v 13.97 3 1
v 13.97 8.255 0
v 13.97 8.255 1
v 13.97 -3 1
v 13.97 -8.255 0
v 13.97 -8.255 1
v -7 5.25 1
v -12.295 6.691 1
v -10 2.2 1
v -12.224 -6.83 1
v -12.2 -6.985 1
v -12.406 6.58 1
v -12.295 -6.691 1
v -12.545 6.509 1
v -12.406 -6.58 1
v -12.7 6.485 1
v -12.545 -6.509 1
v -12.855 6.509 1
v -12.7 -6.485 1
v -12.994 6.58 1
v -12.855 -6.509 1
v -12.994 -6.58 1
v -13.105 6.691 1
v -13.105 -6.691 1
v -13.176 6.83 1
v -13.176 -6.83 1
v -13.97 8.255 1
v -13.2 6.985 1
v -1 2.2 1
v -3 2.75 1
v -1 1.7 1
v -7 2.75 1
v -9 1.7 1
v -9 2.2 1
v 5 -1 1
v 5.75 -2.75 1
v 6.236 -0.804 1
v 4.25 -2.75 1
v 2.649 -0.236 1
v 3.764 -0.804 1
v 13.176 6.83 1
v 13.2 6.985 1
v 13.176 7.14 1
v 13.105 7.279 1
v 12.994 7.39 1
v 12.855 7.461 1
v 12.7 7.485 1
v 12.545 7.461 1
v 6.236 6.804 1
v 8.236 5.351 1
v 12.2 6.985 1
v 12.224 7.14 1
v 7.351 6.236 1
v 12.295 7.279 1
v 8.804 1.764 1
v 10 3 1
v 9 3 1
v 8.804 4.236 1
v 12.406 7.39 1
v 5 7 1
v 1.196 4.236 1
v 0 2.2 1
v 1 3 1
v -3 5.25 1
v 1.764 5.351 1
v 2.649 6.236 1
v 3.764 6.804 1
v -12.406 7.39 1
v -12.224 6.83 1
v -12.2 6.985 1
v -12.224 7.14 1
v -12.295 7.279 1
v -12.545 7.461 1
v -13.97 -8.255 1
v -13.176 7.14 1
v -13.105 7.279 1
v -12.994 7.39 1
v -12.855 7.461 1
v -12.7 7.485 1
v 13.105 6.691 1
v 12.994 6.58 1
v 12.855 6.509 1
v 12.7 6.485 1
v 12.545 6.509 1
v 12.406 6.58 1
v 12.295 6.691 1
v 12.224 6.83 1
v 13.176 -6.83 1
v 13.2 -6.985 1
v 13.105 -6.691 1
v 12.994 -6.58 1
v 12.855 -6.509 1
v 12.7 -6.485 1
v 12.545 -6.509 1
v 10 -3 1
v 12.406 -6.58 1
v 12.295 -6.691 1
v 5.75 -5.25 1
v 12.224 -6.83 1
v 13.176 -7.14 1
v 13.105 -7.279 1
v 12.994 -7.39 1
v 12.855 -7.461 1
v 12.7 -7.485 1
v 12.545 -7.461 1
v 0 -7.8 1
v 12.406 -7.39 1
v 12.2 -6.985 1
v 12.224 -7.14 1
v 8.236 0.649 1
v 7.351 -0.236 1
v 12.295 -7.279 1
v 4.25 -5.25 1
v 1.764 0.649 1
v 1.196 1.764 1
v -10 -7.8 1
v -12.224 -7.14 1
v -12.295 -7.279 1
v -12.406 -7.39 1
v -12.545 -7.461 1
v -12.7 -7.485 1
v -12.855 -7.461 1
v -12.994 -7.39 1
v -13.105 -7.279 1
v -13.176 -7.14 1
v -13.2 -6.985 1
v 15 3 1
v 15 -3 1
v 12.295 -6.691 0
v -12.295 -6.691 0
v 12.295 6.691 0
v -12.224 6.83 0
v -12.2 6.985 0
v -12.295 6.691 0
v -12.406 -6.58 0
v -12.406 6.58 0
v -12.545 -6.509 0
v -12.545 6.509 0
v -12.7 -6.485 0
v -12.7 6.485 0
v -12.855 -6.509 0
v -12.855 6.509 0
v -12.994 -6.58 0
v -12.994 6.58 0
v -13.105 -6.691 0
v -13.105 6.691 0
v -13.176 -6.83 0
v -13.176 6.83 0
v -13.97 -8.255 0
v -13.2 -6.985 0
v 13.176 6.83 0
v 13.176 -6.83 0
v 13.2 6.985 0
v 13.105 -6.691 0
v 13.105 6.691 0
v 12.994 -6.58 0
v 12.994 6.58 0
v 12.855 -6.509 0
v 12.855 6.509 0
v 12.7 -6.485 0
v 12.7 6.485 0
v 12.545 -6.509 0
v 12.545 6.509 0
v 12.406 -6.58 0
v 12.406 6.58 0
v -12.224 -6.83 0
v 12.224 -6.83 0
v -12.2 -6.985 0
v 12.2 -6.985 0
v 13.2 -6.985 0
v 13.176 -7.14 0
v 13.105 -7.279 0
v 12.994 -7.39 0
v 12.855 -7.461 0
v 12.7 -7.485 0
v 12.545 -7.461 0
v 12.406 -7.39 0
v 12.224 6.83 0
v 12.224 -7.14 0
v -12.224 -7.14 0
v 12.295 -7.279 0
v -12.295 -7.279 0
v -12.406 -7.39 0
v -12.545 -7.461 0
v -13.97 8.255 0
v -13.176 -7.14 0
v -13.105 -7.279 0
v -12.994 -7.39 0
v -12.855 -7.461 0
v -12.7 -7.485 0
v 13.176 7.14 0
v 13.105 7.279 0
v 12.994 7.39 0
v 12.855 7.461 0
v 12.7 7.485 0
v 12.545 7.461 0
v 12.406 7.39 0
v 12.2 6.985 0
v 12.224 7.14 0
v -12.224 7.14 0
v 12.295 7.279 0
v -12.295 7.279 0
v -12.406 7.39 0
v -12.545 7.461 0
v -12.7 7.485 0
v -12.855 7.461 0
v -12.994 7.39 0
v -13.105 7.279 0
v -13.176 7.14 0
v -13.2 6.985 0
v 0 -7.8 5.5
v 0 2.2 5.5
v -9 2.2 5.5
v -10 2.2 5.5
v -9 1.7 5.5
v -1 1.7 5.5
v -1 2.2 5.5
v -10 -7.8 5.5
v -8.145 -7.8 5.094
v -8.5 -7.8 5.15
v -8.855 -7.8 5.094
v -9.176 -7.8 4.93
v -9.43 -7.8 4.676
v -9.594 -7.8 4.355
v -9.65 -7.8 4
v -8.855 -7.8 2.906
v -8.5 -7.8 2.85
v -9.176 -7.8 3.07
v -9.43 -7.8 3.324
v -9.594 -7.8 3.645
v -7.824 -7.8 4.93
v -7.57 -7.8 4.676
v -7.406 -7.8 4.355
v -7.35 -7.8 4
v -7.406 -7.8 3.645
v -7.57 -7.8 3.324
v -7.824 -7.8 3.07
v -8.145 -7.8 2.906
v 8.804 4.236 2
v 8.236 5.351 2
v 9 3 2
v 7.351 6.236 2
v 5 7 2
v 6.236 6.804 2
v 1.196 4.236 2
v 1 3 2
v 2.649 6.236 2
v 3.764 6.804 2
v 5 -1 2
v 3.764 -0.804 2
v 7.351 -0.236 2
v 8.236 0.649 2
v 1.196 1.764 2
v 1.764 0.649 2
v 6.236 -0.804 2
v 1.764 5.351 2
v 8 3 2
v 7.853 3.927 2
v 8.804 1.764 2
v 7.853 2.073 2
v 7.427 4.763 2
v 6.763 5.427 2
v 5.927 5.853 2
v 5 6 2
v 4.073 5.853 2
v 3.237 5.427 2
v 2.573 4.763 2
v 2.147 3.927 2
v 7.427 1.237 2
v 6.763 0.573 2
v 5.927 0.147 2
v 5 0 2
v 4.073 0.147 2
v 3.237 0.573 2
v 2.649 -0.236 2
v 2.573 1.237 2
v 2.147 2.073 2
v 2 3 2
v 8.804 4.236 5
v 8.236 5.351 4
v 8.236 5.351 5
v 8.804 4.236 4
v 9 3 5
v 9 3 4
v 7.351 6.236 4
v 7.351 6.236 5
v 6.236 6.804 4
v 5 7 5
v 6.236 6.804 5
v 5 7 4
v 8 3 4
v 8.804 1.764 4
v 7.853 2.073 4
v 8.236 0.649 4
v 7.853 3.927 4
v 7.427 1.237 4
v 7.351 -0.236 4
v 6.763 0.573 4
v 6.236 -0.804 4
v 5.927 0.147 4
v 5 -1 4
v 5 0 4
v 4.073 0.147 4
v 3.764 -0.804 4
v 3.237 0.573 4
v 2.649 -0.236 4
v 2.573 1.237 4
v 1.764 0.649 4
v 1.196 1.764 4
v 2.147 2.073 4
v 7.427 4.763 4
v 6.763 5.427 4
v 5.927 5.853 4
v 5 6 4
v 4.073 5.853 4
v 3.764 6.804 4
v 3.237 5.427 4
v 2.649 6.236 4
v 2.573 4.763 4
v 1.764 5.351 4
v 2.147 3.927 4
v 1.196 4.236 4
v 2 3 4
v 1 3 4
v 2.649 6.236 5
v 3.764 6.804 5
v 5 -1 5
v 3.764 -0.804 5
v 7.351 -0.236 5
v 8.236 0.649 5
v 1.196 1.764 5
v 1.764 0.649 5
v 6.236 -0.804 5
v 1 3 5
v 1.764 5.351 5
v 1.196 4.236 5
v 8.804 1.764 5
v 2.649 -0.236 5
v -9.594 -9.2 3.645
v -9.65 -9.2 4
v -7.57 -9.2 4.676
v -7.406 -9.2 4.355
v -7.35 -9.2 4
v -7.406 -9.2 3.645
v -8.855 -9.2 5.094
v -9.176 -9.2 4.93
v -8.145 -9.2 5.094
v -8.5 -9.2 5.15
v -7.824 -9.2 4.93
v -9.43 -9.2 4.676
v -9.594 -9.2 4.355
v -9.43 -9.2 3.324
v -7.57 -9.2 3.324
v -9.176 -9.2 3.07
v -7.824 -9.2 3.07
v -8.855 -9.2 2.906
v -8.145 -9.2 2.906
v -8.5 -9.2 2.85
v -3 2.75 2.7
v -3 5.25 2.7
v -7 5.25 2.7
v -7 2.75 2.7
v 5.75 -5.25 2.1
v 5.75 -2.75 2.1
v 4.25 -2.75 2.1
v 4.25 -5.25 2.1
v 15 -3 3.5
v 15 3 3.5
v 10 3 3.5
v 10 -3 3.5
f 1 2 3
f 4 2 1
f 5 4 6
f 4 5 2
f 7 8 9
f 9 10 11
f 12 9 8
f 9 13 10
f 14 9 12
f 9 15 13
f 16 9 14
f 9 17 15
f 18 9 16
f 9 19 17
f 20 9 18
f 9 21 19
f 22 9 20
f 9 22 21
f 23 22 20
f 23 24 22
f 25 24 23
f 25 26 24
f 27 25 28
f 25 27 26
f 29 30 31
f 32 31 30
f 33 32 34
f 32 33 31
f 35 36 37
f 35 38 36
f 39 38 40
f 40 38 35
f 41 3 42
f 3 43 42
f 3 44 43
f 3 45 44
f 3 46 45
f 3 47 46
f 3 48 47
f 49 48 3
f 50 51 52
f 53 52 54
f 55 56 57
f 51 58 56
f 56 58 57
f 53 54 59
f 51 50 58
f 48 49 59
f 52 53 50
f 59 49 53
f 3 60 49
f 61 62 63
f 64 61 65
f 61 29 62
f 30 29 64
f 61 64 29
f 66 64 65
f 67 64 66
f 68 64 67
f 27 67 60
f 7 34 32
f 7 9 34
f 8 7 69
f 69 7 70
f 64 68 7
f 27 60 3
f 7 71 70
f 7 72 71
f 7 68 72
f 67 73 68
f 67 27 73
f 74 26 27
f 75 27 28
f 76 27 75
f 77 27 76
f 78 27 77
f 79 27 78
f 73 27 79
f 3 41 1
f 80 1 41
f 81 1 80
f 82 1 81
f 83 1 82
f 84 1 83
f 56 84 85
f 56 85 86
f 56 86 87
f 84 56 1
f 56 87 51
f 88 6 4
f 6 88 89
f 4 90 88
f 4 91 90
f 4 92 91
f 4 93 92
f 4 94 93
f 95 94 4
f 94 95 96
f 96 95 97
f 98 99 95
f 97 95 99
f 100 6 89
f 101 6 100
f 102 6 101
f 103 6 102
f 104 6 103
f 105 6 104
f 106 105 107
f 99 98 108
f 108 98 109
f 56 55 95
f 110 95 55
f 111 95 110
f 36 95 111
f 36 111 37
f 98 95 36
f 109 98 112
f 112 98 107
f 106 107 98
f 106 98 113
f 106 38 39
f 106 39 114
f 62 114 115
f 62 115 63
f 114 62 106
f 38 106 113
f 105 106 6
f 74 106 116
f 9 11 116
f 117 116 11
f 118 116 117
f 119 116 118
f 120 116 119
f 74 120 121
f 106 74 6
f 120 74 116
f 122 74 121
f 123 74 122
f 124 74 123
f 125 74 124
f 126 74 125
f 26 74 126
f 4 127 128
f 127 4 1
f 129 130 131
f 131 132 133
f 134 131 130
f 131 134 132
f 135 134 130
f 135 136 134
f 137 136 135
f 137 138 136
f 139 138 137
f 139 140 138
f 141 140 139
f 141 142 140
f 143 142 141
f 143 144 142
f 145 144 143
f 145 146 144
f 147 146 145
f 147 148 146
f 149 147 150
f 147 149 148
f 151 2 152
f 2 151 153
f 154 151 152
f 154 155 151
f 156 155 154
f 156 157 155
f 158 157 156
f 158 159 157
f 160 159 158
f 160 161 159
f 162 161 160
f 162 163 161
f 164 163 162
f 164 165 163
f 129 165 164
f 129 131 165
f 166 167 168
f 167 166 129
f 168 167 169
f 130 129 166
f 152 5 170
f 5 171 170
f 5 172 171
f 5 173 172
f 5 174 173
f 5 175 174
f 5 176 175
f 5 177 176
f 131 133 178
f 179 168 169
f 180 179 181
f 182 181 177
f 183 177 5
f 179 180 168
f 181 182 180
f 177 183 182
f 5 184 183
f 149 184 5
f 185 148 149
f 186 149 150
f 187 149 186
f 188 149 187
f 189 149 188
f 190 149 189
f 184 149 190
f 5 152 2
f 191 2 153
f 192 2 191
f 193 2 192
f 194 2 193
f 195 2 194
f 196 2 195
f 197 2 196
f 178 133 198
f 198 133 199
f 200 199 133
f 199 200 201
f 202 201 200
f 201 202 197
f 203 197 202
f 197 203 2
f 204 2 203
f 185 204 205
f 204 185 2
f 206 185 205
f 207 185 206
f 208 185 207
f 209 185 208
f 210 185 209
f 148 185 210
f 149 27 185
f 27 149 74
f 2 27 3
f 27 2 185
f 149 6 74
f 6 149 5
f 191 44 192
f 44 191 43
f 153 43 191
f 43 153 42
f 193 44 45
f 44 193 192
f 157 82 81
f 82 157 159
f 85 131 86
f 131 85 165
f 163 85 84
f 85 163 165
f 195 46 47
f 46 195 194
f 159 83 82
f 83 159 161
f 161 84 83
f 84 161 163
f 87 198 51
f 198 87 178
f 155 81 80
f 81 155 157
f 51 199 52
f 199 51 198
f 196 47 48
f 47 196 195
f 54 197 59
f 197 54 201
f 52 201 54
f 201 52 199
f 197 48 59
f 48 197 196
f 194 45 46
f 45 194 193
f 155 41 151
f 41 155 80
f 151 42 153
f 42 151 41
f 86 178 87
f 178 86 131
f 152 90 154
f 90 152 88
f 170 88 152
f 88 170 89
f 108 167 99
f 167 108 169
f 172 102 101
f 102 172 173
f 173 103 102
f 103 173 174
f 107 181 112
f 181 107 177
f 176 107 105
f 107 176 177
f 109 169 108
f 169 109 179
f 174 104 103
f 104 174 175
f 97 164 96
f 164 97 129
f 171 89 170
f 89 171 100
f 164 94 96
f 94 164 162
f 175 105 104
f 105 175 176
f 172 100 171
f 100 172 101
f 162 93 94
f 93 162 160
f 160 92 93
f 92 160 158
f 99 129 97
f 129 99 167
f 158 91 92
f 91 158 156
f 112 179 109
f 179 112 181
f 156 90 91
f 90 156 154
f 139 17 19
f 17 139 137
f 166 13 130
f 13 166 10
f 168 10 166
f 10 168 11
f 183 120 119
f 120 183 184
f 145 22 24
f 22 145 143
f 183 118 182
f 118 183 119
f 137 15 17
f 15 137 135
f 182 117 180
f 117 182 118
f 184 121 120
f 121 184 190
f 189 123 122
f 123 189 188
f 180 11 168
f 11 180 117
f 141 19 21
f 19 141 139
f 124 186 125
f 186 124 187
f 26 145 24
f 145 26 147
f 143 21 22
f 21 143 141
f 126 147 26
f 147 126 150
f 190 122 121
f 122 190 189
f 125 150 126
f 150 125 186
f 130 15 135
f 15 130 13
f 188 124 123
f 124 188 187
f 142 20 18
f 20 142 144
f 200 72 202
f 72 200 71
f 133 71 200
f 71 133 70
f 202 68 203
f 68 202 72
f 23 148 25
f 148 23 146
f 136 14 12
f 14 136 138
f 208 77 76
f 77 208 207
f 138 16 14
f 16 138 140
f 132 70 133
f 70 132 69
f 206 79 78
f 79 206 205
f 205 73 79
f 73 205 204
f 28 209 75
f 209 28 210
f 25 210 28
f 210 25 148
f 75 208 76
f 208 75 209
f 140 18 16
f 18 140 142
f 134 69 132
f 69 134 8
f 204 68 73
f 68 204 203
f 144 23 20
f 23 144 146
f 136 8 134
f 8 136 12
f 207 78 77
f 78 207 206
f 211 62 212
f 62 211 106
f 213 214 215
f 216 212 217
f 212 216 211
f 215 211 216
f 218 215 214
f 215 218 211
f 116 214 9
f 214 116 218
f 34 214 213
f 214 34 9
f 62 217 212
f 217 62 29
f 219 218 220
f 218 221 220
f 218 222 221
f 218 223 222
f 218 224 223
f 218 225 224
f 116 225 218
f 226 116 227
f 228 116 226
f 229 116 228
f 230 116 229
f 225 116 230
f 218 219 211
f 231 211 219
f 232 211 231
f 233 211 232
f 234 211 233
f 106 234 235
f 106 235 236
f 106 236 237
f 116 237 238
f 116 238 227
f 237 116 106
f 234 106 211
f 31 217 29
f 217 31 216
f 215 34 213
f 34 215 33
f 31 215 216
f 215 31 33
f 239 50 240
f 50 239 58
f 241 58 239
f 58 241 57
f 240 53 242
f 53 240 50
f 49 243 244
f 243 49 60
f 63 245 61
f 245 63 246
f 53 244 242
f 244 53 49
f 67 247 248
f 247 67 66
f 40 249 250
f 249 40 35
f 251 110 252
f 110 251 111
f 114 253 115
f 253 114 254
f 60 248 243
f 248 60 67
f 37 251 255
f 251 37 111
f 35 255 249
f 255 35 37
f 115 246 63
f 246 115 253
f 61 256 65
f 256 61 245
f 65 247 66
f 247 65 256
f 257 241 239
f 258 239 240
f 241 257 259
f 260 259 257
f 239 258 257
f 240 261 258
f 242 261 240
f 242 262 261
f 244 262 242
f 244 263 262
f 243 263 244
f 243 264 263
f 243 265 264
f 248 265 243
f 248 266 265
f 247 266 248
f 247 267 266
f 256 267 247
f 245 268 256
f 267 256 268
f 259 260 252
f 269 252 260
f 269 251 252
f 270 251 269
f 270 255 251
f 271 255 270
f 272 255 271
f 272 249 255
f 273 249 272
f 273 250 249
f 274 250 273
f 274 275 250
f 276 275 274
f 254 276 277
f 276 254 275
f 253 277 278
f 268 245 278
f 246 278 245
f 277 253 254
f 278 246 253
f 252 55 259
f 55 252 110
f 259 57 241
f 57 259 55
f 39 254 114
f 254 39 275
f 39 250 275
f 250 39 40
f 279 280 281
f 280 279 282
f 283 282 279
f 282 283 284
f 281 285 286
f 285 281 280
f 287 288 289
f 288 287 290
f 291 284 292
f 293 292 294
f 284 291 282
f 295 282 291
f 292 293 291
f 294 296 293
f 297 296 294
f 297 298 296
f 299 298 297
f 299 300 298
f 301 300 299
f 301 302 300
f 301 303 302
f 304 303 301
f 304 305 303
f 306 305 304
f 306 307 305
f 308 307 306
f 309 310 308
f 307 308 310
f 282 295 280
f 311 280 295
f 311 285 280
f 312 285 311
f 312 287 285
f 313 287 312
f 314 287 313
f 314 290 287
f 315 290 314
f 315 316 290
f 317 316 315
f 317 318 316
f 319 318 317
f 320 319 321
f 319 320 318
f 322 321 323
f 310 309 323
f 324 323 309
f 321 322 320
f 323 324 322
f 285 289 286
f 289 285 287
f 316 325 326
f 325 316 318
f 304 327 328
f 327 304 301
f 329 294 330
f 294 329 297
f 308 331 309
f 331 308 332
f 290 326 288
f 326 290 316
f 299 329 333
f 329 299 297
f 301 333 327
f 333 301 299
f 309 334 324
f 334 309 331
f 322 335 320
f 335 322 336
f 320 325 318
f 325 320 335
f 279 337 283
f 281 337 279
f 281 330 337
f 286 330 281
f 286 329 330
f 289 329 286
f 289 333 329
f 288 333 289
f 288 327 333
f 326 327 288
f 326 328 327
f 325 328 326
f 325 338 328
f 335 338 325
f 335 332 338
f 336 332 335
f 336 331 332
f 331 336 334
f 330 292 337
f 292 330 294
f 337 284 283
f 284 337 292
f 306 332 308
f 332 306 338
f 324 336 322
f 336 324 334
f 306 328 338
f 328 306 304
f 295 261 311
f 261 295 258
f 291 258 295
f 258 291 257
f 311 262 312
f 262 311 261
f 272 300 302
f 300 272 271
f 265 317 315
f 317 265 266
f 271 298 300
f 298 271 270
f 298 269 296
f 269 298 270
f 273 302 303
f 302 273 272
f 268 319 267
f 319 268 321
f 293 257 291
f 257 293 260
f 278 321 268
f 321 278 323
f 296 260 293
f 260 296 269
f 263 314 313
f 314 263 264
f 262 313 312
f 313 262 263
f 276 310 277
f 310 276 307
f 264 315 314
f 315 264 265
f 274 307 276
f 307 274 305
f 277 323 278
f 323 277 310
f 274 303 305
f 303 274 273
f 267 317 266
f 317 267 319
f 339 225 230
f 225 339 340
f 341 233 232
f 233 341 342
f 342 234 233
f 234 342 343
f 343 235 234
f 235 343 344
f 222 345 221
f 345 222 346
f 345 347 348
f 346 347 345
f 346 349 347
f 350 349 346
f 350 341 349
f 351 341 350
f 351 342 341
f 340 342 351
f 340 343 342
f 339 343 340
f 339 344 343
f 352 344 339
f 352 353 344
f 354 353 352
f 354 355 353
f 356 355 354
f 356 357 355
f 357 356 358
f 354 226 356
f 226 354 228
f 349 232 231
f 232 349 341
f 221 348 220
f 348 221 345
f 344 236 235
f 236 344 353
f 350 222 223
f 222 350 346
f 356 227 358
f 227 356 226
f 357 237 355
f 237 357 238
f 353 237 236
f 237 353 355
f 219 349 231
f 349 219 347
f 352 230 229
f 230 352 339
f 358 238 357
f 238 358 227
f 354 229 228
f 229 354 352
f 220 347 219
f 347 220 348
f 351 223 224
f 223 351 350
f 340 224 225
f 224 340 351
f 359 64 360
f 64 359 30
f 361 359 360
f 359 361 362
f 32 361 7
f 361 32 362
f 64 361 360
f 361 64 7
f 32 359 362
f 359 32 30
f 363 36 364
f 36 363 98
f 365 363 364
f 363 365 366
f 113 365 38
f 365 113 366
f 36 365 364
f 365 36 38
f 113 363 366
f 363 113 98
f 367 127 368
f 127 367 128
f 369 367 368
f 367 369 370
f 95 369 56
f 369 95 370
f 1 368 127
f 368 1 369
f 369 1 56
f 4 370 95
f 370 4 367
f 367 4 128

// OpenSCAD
// file: ../utils/basic_shapes.scad
//
// Licensed under the MIT license. See LICENSE file in the project root for details.
//

use <operations.scad>;

module plate(length=0, width=0, thickness=0, l=0, w=0, t=0){
    length_ =    (l>0)? l : length;
    width_ =     (w>0)? w : width;
    thickness_ = (t>0)? t : thickness;
    
    translate([0, 0, thickness_/2]) cube(size=[length_, width_, thickness_], center=true);
}

module rounded_plate(length=0, width=0, thickness=0, radius=0, l=0, w=0, t=0, r=0){
    length_ =    (l>0)? l : length;
    width_ =     (w>0)? w : width;
    thickness_ = (t>0)? t : thickness;
    radius_ =    (r>0)? r : radius;
    
    l1 = length_-2*radius_;
    l2 = width_-2*radius_;
    
    if(radius_ == 0)
        plate(l=l, w=w, t=t);
    else
        hull(){
            plate(length=l1, width=l2, thickness=thickness_);
            translate([-l1/2, -l2/2, 0]) cylinder(r=radius_, h=thickness_);
            translate([ l1/2, -l2/2, 0]) cylinder(r=radius_, h=thickness_);
            translate([ l1/2,  l2/2, 0]) cylinder(r=radius_, h=thickness_);
            translate([-l1/2,  l2/2, 0]) cylinder(r=radius_, h=thickness_);
        }
}

module tube(h=0, rin=0, rout=0, center=false, height=0, radius_in=0, radius_out=0){
    height_ = (h>0)? h : height;
    rin_ = (rin>0)? rin : radius_in;
    rout_ = (rout>0)? rout : radius_out;
    
    difference(){
        cylinder(h=height_, r=rout_, center=center);
        translate([0, 0, -1]) cylinder(h=height_+3, r=rin_, center=center);
    }
}


module basic_shapes_demo()
{
    repeat_displace([0, 20, 0], center=true){
        plate(l=10, width=5, t=1);
        rounded_plate(length=10, w=5, t=1, r=1);
        tube(h=10, rin=5, rout=6, center=true);
    }
}

basic_shapes_demo($fn=30);
// file: ../utils/operations.scad
//
// Licensed under the MIT license. See LICENSE file in the project root for details.
//


module mirror_copy(L)
{
    children();
    mirror(L) children();
}

module repeat_displace(T, center=false)
{
    tx = T[0]; ty = T[1]; tz = T[2];

    module tr_mult(i){translate([tx*i, ty*i, tz*i]) children();}

    tr_mult((center)?-($children-1)/2:0) for(i=[0 : $children-1]) tr_mult(i) children(i);
}


// Demo

module operations__demo()
{
    translate([0, 0, 0]) mirror_copy([1, 0, 0]) translate([10, 0, 0]) rotate([0, 0, 10]) cube(10, center=true);

    translate([0, 20, 0]) repeat_displace([10, 0, 0], center=true){
        cube(10, center=true);
        cylinder(d=5, h=2, center=true, $fn=20);
        cube(5, center=true);
        sphere(d=8, $fn=20);
    }
}

operations__demo();
// file: ../utils/common.scad
//
// Licensed under the MIT license. See LICENSE file in the project root for details.
//

include <operations.scad>;
include <basic_shapes.scad>;
// main file
//
// Licensed under the MIT license. See LICENSE file in the project root for details.
//

use <../utils/common.scad>;


COLOR_BOOST_PLATE = [0.15, 0.15, 0.8];
COLOR_BOOST_POTENTIOMETRE = [0.3, 0.3, 0.98];
COLOR_BOOST_IC = [0.1, 0.1, 0.1];
COLOR_BOOST_COIL = [0.7, 0.5, 0.1];
COLOR_BOOST_METAL = [0.6, 0.6, 0.6];

module boost_converter(){
    // main plate
    color(COLOR_BOOST_PLATE) difference(){
        plate(l=27.94, w=2.54*6.5, t=1.0);
        translate([2.54*5, 2.54*2.75, -0.5]) cylinder(r=0.5, h=2);
        translate([2.54*5, -2.54*2.75, -0.5]) cylinder(r=0.5, h=2);
        translate([-2.54*5, -2.54*2.75, -0.5]) cylinder(r=0.5, h=2);
        translate([-2.54*5, 2.54*2.75, -0.5]) cylinder(r=0.5, h=2);
    }
    
    // potentiometre
    color(COLOR_BOOST_POTENTIOMETRE) translate([-5, -2.8, 0.5]) difference(){
        plate(l=10, w=10, t=5);
        translate([0, 5, -0.1]) plate(l=8, w=1, t=6);
    }
    color(COLOR_BOOST_METAL) translate([-8.5, -7, 4]) rotate([90, 0, 0]) cylinder(d=2.3, h=2.2);
    
    // coil
    translate([5, 3, 0.5]) {
        color(COLOR_BOOST_COIL) translate([0, 0, 1]) cylinder(r=3, h=3);
        color(COLOR_BOOST_IC){
            cylinder(r=4, h=1.5);
            translate([0, 0, 3.5]) cylinder(r=4, h=1.0);
        }
    }
    
    // diode
    color(COLOR_BOOST_IC) translate([-5, 4, 0.5]) plate(l=4, w=2.5, t=2.2);
    // circuit
    color(COLOR_BOOST_IC) translate([5, -4, 0.5]) plate(l=1.5, w=2.5, t=1.6);
    
    // usb port
    color(COLOR_BOOST_METAL) translate([12.5, 0, 1.0]) plate(l=5, w=6, t=2.5);
}

boost_converter($fn=20);
